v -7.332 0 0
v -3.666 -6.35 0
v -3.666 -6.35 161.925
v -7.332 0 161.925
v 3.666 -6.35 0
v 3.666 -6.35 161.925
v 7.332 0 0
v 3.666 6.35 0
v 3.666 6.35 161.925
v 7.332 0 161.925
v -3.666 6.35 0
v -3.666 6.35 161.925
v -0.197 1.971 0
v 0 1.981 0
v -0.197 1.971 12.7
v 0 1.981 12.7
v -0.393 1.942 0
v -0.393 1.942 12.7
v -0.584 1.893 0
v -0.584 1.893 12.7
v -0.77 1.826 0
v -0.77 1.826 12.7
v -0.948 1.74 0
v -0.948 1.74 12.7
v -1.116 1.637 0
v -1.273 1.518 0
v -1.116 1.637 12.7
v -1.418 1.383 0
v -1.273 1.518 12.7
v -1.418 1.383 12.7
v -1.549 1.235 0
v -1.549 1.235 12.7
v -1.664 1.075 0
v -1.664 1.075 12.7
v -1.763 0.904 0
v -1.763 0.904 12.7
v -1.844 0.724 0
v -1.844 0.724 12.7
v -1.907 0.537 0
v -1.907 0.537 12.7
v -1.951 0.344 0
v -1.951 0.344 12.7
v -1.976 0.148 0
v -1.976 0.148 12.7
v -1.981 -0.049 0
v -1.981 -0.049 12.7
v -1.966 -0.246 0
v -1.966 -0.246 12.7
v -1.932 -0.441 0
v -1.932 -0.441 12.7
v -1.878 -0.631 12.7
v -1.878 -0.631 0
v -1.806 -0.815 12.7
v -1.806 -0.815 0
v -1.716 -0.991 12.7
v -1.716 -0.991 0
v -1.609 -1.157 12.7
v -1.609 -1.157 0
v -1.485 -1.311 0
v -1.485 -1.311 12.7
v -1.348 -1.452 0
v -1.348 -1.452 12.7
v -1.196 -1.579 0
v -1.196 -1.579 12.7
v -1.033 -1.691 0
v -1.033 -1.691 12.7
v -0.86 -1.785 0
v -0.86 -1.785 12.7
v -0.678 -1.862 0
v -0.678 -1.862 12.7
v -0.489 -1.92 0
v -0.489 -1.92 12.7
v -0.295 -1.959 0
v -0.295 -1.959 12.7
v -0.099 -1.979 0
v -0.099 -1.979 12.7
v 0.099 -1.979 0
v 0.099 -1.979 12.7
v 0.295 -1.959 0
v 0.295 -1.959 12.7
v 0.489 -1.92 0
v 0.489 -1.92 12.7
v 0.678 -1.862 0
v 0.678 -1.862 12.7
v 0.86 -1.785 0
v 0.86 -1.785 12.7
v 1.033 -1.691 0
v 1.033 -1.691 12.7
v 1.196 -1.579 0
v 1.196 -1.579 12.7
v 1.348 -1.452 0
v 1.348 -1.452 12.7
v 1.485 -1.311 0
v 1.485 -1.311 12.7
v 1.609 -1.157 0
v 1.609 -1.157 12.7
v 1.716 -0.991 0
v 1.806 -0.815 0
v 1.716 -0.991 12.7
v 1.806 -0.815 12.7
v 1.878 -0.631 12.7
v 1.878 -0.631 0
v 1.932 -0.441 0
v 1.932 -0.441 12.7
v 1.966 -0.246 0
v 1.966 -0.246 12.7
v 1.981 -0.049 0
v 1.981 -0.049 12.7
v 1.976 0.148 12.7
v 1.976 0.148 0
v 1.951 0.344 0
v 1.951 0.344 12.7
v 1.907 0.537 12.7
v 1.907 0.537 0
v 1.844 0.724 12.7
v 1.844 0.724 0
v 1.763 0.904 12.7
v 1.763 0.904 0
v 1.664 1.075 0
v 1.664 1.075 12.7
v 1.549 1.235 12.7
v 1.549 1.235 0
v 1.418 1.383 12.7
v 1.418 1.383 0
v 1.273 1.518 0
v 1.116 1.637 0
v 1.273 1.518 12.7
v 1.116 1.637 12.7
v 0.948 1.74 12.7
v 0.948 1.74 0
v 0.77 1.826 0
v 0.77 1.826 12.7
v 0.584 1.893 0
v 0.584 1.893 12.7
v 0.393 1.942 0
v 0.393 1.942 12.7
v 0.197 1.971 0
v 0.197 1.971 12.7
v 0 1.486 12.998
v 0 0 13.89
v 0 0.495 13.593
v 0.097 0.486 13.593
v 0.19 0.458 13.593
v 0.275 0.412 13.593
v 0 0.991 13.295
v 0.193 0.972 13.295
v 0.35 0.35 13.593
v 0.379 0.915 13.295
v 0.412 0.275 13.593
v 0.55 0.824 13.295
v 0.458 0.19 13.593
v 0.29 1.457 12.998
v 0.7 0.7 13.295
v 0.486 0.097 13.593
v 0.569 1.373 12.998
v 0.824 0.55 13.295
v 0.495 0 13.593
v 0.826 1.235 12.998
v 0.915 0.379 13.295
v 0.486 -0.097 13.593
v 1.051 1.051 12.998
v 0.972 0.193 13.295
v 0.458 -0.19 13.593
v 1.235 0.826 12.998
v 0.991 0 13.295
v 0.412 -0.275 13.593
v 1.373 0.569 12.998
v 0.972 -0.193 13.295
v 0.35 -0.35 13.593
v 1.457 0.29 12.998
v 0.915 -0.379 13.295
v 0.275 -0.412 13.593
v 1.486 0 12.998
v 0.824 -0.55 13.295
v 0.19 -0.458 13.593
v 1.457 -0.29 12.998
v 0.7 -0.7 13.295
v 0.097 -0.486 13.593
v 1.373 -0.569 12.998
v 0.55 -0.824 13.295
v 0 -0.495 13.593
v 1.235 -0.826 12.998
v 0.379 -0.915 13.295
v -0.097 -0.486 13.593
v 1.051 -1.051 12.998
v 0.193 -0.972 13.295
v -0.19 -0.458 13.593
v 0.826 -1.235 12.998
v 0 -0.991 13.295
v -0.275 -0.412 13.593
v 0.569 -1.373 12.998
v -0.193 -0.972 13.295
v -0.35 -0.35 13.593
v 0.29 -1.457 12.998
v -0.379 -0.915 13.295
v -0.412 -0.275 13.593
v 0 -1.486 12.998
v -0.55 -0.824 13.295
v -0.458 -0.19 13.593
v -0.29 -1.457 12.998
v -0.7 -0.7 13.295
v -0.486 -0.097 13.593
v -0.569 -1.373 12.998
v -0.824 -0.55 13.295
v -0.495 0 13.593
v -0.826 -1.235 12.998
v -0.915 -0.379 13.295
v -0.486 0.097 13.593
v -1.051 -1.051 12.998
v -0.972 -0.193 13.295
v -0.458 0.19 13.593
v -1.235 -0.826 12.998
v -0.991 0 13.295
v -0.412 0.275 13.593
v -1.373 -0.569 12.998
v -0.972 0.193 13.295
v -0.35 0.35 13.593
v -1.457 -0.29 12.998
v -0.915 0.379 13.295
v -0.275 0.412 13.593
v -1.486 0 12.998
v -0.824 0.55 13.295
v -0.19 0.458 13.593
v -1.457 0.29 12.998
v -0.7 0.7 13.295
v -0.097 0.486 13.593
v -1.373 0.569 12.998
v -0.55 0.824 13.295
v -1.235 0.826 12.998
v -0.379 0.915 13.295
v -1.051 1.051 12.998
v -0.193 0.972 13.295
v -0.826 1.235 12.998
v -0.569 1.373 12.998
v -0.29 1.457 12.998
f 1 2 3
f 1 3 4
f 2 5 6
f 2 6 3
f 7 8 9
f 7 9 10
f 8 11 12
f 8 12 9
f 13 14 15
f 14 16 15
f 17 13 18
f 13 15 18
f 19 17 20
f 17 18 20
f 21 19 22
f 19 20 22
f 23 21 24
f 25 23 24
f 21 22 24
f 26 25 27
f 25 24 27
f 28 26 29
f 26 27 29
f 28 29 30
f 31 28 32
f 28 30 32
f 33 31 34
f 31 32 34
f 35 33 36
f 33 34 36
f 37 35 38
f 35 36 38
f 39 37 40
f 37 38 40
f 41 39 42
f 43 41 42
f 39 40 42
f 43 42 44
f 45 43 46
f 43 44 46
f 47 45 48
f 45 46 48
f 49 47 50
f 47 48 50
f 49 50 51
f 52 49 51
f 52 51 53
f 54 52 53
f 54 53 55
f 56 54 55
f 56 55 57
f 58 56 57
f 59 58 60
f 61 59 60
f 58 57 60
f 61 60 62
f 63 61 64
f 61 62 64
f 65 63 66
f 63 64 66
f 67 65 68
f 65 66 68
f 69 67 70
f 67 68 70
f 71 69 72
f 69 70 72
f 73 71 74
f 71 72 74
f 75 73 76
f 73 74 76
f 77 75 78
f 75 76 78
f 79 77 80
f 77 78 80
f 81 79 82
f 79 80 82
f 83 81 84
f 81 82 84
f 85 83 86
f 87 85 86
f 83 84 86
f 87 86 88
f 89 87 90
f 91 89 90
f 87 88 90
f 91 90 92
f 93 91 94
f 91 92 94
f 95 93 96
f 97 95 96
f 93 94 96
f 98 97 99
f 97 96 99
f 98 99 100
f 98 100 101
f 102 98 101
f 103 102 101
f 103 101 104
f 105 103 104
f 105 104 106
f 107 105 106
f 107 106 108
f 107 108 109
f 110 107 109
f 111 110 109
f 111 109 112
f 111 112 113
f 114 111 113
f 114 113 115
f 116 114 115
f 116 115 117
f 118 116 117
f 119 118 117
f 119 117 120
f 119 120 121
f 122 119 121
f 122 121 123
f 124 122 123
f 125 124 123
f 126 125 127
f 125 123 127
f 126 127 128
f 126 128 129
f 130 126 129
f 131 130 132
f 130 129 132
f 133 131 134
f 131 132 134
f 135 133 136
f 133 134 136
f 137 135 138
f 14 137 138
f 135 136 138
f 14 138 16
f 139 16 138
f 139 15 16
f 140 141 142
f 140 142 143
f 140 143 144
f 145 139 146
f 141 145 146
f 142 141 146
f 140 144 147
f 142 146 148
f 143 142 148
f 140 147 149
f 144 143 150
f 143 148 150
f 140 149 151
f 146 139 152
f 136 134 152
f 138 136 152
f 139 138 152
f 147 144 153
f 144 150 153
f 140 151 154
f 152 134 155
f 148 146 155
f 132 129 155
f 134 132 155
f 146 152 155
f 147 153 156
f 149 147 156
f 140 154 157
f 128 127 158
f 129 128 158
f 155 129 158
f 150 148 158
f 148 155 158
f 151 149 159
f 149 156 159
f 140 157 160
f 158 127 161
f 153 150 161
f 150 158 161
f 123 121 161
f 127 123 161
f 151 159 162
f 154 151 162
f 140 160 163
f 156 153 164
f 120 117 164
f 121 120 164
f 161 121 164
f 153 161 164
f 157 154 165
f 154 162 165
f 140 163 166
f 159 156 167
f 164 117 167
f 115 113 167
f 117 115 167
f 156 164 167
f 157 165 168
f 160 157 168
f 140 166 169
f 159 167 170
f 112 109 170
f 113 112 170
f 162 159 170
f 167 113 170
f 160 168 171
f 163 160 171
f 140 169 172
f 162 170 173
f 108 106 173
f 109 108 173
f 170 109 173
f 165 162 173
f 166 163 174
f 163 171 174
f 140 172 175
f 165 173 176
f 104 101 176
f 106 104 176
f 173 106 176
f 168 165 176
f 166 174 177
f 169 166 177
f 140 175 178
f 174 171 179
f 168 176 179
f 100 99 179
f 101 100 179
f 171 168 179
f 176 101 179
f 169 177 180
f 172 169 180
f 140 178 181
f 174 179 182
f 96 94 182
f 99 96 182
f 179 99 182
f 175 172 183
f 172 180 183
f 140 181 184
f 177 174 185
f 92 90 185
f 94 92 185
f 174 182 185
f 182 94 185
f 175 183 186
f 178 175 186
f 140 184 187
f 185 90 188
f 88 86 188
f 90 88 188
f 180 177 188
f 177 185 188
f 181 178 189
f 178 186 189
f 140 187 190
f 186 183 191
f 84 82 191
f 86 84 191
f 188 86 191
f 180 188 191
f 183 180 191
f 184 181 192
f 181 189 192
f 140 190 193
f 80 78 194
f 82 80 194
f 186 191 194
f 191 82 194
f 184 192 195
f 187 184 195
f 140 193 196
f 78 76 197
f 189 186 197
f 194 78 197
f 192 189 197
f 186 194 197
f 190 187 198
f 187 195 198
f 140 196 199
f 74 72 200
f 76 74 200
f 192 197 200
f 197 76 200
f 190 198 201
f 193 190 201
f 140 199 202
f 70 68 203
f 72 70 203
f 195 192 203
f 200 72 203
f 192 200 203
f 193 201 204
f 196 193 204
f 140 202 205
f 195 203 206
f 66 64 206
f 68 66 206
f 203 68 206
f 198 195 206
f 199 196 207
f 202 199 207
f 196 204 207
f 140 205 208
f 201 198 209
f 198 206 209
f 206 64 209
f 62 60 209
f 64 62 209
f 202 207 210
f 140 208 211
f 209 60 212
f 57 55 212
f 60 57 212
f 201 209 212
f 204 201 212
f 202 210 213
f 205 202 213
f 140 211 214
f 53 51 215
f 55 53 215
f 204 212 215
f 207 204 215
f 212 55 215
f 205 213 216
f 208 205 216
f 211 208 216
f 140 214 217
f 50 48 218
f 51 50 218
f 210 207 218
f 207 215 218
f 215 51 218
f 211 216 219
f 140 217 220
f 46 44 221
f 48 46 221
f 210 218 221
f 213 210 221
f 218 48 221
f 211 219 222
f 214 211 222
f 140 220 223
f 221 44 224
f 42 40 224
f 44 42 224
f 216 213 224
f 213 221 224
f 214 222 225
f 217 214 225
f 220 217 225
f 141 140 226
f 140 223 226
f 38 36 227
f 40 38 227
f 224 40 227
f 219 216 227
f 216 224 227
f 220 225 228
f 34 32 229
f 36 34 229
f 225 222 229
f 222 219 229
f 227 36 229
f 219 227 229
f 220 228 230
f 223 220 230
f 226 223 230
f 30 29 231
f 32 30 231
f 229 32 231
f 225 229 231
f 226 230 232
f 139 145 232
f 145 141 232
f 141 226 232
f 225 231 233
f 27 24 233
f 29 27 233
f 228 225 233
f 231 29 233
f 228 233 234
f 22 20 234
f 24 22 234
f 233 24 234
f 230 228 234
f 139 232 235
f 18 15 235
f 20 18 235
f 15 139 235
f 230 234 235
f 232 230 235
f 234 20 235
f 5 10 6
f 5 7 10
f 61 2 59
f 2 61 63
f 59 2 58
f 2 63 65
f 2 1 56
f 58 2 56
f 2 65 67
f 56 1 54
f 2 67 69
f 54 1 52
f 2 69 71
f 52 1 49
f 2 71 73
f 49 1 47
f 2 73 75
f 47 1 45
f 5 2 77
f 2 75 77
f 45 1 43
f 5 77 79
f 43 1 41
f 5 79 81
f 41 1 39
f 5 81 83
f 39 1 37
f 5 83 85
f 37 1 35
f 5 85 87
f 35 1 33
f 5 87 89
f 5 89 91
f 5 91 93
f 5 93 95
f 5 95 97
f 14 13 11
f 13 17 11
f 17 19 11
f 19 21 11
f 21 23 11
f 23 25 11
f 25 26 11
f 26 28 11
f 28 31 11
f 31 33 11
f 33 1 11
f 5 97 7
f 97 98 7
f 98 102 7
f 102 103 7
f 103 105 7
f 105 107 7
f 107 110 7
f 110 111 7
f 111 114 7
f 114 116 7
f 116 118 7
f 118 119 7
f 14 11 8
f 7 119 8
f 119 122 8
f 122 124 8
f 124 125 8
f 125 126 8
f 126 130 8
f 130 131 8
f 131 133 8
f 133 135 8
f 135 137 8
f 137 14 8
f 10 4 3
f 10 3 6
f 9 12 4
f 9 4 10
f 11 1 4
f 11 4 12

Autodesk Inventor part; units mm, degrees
ref_plane "YZ Plane" through (0, 0, 0) normal (1, 0, 0) x (0, 1, 0)
ref_plane "XZ Plane" through (0, 0, 0) normal (0, 1, 0) x (-1, 0, 0)
ref_plane "XY Plane" through (0, 0, 0) normal (0, 0, 1) x (1, 0, 0)
sketch "Sketch1" plane through (0, 0, 0) normal (0, 0, 1) x (1, 0, 0)
  line L0 (3.6662, -6.35) -> (-3.6662, -6.35)
  line L1 (-3.6662, -6.35) -> (-7.3323, 0)
  line L2 (-7.3323, 0) -> (-3.6662, 6.35)
  line L3 (-3.6662, 6.35) -> (3.6662, 6.35)
  line L4 (3.6662, 6.35) -> (7.3323, 0)
  line L5 (7.3323, 0) -> (3.6662, -6.35)
  point P0 (0, 0)
  point P1 (0, 0)
  dimension "d0" = 12.7
extrude "Extrusion1" add sketch "Sketch1" along normal blind 161.925
sketch "Sketch2" plane through (0, 0, 0) normal (0, 0, -1) x (-1, 0, 0)
  point P0 (0, 0)
  point P1 (0, 0)
hole "Hole1" at (0, 0, 0) direction (0, 0, 1) diameter 3.9624 depth 12.7 tip angle 118 thread size "10-32 UNF" class "2B" standard "ANSI Unified Screw Threads"
properties part number "STOCK,HEX,SHAFT,HUB"
